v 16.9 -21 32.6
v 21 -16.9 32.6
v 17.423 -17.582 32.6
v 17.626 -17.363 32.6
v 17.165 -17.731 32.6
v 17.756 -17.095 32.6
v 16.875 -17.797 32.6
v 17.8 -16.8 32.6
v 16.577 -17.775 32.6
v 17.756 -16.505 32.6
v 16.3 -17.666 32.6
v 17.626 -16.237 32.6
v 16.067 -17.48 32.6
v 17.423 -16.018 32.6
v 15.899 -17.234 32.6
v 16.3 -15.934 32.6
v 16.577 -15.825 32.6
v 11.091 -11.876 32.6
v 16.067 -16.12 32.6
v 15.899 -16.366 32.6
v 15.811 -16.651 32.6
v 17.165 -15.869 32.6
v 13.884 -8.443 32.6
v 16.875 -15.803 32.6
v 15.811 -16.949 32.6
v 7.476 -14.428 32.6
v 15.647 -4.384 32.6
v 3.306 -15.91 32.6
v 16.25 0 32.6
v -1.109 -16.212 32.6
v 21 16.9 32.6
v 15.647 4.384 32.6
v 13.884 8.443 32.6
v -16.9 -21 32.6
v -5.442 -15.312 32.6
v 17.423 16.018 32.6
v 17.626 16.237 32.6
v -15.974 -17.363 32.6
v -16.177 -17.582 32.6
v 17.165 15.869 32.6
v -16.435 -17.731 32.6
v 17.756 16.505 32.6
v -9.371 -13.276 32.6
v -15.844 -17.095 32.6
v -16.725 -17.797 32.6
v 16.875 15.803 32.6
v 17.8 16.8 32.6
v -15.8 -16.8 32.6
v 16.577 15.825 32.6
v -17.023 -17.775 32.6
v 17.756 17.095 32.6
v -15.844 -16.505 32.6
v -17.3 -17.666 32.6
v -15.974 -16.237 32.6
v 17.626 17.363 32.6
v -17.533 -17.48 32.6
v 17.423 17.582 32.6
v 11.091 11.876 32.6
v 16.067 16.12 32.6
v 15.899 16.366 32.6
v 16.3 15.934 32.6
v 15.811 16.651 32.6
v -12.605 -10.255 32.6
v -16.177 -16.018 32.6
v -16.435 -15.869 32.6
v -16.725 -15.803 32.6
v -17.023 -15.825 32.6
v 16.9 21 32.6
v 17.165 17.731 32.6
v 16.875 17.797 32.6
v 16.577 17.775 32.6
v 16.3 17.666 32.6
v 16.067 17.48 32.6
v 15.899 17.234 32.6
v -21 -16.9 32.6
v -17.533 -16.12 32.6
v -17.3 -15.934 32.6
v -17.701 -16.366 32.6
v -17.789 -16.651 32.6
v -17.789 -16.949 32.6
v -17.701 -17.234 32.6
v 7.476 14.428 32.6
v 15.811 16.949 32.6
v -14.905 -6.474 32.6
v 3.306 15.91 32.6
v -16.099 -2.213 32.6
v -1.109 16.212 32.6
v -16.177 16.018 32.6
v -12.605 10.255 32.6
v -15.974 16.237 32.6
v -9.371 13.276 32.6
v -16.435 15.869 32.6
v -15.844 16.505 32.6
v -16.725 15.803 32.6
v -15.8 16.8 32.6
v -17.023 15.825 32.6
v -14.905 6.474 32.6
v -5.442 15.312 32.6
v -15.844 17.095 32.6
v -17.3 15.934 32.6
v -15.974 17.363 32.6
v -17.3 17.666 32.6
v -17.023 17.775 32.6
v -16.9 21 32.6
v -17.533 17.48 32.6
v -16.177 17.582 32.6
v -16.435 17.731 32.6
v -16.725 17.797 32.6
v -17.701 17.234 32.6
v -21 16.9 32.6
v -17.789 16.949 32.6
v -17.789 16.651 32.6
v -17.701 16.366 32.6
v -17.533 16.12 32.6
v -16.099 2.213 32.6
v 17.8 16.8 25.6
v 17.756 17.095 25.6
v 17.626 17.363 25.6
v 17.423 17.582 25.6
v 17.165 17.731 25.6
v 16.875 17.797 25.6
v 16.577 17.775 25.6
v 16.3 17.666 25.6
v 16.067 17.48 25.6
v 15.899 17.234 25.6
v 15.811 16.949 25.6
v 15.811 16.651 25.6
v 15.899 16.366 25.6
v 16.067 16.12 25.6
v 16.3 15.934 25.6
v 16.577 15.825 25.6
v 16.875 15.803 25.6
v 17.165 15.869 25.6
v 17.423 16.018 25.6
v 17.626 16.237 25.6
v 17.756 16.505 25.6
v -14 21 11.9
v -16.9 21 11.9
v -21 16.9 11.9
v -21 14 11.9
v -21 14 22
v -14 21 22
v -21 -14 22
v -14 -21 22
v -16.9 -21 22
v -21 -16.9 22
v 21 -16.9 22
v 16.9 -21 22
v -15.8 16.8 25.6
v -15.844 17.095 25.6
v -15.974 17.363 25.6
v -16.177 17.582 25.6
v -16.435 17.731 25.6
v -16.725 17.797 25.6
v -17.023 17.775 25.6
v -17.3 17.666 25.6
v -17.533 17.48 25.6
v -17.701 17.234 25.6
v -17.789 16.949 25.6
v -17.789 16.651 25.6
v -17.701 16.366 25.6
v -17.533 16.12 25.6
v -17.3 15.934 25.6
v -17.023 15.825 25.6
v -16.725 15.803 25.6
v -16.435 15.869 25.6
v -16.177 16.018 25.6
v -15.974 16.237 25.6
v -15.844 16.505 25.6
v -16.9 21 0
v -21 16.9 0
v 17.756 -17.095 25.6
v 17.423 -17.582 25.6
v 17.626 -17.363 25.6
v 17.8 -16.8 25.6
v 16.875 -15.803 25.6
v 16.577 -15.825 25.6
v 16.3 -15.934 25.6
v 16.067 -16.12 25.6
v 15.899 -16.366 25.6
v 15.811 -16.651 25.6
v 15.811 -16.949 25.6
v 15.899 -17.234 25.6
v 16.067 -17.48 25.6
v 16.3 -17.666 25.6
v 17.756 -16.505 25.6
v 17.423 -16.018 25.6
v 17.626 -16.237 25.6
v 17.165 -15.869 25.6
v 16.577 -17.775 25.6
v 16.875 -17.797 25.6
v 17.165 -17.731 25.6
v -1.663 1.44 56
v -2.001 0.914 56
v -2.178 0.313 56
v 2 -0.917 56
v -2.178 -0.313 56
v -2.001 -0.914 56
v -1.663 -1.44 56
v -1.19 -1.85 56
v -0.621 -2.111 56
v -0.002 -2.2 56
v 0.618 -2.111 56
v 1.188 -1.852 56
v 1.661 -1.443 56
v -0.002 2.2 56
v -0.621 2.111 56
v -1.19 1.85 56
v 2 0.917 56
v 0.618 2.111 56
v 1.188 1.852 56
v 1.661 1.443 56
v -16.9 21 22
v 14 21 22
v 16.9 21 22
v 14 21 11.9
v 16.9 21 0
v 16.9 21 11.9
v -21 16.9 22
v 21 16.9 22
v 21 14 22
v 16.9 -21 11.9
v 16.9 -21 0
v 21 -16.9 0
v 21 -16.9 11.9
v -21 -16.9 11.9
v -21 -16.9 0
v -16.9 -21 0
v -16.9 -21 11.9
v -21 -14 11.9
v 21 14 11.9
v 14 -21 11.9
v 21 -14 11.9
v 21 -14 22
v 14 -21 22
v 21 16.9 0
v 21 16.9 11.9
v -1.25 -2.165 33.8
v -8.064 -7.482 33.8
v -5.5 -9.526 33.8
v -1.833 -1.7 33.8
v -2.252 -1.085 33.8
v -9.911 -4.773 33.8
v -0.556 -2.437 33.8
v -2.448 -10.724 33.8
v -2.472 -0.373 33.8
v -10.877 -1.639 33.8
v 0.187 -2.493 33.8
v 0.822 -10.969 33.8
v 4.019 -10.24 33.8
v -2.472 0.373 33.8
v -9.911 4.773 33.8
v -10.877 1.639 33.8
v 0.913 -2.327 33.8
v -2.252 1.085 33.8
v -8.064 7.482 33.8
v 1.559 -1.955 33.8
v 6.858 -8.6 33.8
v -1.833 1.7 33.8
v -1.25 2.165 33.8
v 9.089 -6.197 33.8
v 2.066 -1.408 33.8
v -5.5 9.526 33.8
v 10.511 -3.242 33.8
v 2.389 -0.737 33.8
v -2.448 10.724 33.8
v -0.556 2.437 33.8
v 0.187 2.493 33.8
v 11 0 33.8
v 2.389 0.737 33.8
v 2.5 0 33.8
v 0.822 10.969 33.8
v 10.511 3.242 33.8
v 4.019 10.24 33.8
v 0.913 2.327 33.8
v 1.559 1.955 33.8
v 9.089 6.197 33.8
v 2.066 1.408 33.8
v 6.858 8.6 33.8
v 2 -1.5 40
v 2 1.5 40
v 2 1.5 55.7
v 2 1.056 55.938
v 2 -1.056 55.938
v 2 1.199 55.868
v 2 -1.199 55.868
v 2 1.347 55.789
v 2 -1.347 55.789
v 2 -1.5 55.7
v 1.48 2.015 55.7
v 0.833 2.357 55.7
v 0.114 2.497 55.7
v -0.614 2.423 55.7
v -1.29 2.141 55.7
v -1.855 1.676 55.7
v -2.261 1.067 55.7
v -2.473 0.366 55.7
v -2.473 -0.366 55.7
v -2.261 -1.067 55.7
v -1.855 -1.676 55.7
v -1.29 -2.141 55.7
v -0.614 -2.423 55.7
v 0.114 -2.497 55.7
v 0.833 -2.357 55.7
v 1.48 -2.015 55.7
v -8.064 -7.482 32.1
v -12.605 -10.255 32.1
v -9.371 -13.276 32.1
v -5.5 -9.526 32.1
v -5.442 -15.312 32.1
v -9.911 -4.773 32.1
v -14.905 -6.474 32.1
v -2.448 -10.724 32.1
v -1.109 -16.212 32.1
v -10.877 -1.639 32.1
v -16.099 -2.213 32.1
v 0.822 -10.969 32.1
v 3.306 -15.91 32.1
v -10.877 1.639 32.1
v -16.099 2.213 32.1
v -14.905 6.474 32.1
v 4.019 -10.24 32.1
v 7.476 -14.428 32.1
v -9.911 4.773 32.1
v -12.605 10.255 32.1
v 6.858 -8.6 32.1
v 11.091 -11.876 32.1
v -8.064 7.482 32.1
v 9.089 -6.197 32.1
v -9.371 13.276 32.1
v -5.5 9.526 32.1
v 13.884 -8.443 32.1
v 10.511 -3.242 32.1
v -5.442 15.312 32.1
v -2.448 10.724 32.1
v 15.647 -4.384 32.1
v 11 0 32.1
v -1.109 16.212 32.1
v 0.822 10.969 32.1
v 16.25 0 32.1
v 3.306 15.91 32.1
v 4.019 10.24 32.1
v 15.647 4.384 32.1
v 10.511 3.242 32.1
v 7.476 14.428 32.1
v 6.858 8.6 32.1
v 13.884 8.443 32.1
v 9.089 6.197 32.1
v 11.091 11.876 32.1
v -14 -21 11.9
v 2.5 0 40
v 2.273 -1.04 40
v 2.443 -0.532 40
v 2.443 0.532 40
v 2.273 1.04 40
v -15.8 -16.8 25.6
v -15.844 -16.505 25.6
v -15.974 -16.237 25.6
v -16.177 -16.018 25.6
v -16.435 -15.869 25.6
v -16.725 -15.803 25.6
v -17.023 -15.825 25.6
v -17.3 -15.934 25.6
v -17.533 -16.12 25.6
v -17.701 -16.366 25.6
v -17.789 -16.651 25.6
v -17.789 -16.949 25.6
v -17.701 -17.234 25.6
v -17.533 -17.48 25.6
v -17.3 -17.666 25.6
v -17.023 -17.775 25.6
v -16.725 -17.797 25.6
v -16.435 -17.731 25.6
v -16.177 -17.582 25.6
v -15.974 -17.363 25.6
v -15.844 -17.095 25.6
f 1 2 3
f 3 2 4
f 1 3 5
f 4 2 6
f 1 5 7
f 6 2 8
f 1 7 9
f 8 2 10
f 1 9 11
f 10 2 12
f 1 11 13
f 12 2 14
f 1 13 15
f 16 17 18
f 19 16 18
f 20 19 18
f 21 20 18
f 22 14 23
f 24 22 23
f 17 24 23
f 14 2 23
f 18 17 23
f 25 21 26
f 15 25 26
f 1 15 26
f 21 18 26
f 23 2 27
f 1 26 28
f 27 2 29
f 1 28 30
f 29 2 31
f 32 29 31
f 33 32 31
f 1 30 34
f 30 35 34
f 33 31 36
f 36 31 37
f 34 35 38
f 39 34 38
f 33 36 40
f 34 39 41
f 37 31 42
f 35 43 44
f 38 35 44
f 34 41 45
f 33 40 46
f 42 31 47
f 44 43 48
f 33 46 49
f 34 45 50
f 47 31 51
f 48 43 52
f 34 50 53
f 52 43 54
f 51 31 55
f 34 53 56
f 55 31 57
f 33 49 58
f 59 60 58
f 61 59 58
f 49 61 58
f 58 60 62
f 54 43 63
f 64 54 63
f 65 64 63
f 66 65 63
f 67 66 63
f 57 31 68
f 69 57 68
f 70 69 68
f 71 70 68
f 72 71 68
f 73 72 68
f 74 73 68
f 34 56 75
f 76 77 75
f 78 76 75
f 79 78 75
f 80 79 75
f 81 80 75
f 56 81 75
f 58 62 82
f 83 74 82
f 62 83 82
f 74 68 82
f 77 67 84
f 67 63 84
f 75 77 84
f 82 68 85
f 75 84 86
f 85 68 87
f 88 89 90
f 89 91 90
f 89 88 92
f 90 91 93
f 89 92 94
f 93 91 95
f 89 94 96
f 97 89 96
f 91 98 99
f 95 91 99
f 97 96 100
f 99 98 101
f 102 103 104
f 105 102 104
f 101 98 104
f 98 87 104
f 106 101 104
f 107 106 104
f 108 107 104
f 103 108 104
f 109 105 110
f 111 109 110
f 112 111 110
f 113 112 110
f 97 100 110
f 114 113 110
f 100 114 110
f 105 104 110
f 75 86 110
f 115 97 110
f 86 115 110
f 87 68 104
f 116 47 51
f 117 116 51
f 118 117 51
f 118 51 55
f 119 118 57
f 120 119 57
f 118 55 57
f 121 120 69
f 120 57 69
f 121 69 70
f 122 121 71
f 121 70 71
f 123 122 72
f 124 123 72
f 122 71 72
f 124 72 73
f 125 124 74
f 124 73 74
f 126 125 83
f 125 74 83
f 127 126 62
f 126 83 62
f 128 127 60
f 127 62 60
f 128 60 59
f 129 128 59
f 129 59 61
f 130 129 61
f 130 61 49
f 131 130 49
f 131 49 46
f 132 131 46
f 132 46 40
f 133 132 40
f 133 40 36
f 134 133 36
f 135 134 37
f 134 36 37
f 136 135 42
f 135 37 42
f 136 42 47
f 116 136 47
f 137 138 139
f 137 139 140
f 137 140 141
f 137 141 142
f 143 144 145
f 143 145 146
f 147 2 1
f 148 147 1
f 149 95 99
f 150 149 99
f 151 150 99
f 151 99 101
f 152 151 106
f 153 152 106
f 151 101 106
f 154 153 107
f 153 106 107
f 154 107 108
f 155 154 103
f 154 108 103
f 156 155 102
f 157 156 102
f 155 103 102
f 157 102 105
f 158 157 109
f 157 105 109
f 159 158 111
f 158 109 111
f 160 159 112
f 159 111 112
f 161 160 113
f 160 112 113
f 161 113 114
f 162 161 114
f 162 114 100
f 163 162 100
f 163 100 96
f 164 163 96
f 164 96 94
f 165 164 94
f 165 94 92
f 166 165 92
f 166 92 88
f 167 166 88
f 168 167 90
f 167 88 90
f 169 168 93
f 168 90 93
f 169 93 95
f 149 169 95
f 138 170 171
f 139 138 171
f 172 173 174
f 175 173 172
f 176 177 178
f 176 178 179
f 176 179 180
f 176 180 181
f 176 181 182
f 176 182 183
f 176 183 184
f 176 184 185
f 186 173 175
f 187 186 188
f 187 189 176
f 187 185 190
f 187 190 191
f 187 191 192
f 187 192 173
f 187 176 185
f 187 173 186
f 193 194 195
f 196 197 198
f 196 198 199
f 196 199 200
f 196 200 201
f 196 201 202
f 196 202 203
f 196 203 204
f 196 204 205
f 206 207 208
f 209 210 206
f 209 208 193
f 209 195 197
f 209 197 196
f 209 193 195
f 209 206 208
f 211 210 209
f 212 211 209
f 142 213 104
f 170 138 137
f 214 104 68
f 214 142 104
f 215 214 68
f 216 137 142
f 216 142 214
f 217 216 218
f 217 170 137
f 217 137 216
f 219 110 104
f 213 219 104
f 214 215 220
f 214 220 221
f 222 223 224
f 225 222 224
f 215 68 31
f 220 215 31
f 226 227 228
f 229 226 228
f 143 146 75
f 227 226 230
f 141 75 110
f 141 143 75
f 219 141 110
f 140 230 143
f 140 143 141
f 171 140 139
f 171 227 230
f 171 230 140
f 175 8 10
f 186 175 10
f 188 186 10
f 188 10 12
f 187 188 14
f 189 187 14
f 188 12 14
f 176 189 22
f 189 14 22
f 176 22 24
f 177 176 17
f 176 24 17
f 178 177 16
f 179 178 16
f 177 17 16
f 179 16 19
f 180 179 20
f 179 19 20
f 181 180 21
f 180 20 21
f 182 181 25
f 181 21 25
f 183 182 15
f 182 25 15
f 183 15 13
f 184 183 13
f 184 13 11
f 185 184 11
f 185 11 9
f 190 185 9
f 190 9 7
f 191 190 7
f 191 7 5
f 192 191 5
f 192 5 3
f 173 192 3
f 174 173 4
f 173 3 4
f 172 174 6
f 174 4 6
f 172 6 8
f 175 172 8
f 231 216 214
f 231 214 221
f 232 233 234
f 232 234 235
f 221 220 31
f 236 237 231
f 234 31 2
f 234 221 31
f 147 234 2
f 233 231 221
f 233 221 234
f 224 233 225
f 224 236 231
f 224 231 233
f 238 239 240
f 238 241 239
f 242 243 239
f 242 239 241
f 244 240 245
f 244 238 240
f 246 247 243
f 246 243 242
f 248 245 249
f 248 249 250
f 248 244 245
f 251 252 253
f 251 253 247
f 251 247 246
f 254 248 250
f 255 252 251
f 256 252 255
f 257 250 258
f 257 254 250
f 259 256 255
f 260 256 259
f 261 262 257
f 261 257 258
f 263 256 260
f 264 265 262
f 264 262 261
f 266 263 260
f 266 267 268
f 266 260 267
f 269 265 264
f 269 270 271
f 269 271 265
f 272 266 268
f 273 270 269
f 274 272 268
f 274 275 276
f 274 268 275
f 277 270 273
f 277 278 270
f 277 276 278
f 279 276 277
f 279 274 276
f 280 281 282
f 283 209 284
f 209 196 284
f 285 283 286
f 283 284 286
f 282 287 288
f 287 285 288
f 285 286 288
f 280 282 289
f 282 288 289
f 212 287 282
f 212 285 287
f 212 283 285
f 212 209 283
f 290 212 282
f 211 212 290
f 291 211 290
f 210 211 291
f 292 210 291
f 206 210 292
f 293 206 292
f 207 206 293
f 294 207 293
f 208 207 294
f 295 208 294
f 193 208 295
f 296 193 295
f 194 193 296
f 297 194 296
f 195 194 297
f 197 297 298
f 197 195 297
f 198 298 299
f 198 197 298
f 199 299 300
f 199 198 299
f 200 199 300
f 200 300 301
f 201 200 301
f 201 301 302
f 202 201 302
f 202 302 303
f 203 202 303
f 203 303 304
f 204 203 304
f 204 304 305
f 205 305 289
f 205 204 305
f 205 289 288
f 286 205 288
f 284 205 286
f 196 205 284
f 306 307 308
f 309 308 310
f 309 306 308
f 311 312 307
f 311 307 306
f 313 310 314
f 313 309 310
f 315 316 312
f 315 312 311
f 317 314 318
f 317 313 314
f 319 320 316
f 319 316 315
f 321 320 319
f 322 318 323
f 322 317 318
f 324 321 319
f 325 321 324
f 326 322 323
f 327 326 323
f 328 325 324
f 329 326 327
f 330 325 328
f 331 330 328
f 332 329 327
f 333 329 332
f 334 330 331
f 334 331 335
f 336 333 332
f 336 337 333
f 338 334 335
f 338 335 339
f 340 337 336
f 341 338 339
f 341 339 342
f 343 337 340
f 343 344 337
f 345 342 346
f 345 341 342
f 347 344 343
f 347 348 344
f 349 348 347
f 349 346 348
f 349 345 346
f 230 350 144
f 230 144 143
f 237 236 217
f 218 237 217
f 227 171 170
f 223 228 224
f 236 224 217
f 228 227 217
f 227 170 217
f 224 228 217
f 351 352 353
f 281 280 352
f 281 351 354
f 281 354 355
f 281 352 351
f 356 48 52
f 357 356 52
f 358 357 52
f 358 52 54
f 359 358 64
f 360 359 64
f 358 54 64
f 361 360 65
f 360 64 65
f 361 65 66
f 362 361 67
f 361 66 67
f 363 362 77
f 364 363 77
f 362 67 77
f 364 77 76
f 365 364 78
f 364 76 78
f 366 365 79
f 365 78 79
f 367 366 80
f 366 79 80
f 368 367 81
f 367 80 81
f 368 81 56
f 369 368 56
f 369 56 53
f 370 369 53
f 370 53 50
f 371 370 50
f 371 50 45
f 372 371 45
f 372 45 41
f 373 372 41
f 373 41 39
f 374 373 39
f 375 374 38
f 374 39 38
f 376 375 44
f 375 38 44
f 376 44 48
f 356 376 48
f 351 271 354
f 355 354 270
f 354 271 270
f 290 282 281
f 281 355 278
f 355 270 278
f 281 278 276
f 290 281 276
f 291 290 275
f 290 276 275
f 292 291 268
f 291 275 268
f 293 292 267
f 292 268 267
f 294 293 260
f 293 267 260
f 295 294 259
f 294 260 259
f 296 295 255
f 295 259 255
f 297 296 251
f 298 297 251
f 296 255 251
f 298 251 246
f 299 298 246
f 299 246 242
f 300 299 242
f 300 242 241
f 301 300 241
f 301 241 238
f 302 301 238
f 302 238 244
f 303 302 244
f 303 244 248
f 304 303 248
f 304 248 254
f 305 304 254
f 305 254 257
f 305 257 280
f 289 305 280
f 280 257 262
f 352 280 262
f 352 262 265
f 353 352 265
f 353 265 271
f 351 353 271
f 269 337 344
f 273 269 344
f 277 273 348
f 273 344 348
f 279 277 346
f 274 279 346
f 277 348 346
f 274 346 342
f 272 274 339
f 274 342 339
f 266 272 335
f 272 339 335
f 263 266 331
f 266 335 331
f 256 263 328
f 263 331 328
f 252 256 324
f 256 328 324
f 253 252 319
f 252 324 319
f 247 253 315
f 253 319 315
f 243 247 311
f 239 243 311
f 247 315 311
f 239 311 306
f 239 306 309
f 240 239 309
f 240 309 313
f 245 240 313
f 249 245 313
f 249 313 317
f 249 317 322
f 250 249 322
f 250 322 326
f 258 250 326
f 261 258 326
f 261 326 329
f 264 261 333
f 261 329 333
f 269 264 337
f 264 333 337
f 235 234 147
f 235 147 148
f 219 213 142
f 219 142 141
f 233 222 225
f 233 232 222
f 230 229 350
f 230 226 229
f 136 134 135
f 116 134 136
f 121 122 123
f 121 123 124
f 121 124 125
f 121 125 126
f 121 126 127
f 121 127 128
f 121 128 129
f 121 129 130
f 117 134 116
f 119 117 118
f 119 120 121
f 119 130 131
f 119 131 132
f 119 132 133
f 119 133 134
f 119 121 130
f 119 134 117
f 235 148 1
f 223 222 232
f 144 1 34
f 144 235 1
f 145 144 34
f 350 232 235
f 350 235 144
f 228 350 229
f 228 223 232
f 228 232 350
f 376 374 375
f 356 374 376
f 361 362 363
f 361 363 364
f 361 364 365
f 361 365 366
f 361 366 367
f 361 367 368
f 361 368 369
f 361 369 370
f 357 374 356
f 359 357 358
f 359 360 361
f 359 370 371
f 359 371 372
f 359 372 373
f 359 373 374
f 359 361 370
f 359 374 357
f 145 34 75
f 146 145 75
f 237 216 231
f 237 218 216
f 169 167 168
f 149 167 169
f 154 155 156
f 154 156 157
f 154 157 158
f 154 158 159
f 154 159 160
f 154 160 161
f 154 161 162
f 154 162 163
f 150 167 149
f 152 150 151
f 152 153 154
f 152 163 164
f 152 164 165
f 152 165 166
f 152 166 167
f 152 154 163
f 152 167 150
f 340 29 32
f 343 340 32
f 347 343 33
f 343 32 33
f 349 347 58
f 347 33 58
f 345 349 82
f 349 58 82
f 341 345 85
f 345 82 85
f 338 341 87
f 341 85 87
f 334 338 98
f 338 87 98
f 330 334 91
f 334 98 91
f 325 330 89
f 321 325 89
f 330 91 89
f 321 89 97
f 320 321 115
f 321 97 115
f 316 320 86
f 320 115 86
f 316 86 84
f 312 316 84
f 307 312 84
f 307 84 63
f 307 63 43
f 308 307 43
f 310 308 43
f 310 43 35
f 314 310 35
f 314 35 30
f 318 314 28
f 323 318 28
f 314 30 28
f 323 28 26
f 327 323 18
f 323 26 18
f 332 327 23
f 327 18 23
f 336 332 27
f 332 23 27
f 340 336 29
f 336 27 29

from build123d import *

# Parameters (mm, degrees)
BOSS_EXTRU_1_DEPTH      = 11.9
BOSS_EXTRU_2_DEPTH      = 10.1
BOSS_EXTRU_3_DEPTH      = 10.6
ESQUISSE4_R             = 16.25
ENL_V_MAT_EXTRU_1_DEPTH = 0.5
ESQUISSE5_R             = 11
BOSS_EXTRU_4_DEPTH      = 1.7
ESQUISSE6_R             = 2.5
BOSS_EXTRU_5_DEPTH      = 22.2
CHANFREIN1_SIZE         = 0.3
ENL_V_MAT_EXTRU_2_DEPTH = 16
ESQUISSE8_R             = 1
ENL_V_MAT_EXTRU_3_DEPTH = 7


with BuildPart() as part:
    # Esquisse1 → Boss.-Extru.1 (new body)
    with BuildSketch(Plane.XY):
        Polygon((21, -16.9), (21, 16.9), (16.9, 21), (-16.9, 21), (-21, 16.9), (-21, -16.9), (-16.9, -21), (16.9, -21), align=None)
    extrude(amount=BOSS_EXTRU_1_DEPTH)

    # Esquisse2 → Boss.-Extru.2 (add)
    with BuildSketch(Plane.XY.offset(11.9)):
        Polygon((14, 21), (21, 14), (21, -14), (14, -21), (-14, -21), (-21, -14), (-21, 14), (-14, 21), align=None)
    extrude(amount=BOSS_EXTRU_2_DEPTH)

    # Esquisse3 → Boss.-Extru.3 (add)
    with BuildSketch(Plane.XY.offset(22)):
        Polygon((16.9, 21), (21, 16.9), (21, -16.9), (16.9, -21), (-16.9, -21), (-21, -16.9), (-21, 16.9), (-16.9, 21), align=None)
    extrude(amount=BOSS_EXTRU_3_DEPTH)

    # Esquisse4 → Enlèv. mat.-Extru.1 (cut)
    with BuildSketch(Plane.XY.offset(32.6)):
        Circle(ESQUISSE4_R)
    extrude(amount=-ENL_V_MAT_EXTRU_1_DEPTH, mode=Mode.SUBTRACT)

    # Esquisse5 → Boss.-Extru.4 (add)
    with BuildSketch(Plane.XY.offset(32.1)):
        Circle(ESQUISSE5_R)
    extrude(amount=BOSS_EXTRU_4_DEPTH)

    # Esquisse6 → Boss.-Extru.5 (add)
    with BuildSketch(Plane.XY.offset(33.8)):
        Circle(ESQUISSE6_R)
    extrude(amount=BOSS_EXTRU_5_DEPTH)

    # Chanfrein1
    chanfrein1_edges = [part.edges().sort_by_distance(p)[0] for p in [
        (-2.5, 0, 56),
    ]]
    chamfer(chanfrein1_edges, length=CHANFREIN1_SIZE)

    # Esquisse7 → Enlèv. mat.-Extru.2 (cut)
    with BuildSketch(Plane.XY.offset(56)):
        with BuildLine():
            Line((2, 1.5), (2, -1.5))
            ThreePointArc((2, -1.5), (2.5, 0), (2, 1.5))
        make_face()
    extrude(amount=-ENL_V_MAT_EXTRU_2_DEPTH, mode=Mode.SUBTRACT)

    # Esquisse8 → Enlèv. mat.-Extru.3 (cut)
    with BuildSketch(Plane.XY.offset(32.6)):
        with Locations((-16.8, 16.8)):
            Circle(ESQUISSE8_R)
        with Locations((-16.8, -16.8)):
            Circle(ESQUISSE8_R)
        with Locations((16.8, -16.8)):
            Circle(ESQUISSE8_R)
        with Locations((16.8, 16.8)):
            Circle(ESQUISSE8_R)
    extrude(amount=-ENL_V_MAT_EXTRU_3_DEPTH, mode=Mode.SUBTRACT)


solid = part.part
